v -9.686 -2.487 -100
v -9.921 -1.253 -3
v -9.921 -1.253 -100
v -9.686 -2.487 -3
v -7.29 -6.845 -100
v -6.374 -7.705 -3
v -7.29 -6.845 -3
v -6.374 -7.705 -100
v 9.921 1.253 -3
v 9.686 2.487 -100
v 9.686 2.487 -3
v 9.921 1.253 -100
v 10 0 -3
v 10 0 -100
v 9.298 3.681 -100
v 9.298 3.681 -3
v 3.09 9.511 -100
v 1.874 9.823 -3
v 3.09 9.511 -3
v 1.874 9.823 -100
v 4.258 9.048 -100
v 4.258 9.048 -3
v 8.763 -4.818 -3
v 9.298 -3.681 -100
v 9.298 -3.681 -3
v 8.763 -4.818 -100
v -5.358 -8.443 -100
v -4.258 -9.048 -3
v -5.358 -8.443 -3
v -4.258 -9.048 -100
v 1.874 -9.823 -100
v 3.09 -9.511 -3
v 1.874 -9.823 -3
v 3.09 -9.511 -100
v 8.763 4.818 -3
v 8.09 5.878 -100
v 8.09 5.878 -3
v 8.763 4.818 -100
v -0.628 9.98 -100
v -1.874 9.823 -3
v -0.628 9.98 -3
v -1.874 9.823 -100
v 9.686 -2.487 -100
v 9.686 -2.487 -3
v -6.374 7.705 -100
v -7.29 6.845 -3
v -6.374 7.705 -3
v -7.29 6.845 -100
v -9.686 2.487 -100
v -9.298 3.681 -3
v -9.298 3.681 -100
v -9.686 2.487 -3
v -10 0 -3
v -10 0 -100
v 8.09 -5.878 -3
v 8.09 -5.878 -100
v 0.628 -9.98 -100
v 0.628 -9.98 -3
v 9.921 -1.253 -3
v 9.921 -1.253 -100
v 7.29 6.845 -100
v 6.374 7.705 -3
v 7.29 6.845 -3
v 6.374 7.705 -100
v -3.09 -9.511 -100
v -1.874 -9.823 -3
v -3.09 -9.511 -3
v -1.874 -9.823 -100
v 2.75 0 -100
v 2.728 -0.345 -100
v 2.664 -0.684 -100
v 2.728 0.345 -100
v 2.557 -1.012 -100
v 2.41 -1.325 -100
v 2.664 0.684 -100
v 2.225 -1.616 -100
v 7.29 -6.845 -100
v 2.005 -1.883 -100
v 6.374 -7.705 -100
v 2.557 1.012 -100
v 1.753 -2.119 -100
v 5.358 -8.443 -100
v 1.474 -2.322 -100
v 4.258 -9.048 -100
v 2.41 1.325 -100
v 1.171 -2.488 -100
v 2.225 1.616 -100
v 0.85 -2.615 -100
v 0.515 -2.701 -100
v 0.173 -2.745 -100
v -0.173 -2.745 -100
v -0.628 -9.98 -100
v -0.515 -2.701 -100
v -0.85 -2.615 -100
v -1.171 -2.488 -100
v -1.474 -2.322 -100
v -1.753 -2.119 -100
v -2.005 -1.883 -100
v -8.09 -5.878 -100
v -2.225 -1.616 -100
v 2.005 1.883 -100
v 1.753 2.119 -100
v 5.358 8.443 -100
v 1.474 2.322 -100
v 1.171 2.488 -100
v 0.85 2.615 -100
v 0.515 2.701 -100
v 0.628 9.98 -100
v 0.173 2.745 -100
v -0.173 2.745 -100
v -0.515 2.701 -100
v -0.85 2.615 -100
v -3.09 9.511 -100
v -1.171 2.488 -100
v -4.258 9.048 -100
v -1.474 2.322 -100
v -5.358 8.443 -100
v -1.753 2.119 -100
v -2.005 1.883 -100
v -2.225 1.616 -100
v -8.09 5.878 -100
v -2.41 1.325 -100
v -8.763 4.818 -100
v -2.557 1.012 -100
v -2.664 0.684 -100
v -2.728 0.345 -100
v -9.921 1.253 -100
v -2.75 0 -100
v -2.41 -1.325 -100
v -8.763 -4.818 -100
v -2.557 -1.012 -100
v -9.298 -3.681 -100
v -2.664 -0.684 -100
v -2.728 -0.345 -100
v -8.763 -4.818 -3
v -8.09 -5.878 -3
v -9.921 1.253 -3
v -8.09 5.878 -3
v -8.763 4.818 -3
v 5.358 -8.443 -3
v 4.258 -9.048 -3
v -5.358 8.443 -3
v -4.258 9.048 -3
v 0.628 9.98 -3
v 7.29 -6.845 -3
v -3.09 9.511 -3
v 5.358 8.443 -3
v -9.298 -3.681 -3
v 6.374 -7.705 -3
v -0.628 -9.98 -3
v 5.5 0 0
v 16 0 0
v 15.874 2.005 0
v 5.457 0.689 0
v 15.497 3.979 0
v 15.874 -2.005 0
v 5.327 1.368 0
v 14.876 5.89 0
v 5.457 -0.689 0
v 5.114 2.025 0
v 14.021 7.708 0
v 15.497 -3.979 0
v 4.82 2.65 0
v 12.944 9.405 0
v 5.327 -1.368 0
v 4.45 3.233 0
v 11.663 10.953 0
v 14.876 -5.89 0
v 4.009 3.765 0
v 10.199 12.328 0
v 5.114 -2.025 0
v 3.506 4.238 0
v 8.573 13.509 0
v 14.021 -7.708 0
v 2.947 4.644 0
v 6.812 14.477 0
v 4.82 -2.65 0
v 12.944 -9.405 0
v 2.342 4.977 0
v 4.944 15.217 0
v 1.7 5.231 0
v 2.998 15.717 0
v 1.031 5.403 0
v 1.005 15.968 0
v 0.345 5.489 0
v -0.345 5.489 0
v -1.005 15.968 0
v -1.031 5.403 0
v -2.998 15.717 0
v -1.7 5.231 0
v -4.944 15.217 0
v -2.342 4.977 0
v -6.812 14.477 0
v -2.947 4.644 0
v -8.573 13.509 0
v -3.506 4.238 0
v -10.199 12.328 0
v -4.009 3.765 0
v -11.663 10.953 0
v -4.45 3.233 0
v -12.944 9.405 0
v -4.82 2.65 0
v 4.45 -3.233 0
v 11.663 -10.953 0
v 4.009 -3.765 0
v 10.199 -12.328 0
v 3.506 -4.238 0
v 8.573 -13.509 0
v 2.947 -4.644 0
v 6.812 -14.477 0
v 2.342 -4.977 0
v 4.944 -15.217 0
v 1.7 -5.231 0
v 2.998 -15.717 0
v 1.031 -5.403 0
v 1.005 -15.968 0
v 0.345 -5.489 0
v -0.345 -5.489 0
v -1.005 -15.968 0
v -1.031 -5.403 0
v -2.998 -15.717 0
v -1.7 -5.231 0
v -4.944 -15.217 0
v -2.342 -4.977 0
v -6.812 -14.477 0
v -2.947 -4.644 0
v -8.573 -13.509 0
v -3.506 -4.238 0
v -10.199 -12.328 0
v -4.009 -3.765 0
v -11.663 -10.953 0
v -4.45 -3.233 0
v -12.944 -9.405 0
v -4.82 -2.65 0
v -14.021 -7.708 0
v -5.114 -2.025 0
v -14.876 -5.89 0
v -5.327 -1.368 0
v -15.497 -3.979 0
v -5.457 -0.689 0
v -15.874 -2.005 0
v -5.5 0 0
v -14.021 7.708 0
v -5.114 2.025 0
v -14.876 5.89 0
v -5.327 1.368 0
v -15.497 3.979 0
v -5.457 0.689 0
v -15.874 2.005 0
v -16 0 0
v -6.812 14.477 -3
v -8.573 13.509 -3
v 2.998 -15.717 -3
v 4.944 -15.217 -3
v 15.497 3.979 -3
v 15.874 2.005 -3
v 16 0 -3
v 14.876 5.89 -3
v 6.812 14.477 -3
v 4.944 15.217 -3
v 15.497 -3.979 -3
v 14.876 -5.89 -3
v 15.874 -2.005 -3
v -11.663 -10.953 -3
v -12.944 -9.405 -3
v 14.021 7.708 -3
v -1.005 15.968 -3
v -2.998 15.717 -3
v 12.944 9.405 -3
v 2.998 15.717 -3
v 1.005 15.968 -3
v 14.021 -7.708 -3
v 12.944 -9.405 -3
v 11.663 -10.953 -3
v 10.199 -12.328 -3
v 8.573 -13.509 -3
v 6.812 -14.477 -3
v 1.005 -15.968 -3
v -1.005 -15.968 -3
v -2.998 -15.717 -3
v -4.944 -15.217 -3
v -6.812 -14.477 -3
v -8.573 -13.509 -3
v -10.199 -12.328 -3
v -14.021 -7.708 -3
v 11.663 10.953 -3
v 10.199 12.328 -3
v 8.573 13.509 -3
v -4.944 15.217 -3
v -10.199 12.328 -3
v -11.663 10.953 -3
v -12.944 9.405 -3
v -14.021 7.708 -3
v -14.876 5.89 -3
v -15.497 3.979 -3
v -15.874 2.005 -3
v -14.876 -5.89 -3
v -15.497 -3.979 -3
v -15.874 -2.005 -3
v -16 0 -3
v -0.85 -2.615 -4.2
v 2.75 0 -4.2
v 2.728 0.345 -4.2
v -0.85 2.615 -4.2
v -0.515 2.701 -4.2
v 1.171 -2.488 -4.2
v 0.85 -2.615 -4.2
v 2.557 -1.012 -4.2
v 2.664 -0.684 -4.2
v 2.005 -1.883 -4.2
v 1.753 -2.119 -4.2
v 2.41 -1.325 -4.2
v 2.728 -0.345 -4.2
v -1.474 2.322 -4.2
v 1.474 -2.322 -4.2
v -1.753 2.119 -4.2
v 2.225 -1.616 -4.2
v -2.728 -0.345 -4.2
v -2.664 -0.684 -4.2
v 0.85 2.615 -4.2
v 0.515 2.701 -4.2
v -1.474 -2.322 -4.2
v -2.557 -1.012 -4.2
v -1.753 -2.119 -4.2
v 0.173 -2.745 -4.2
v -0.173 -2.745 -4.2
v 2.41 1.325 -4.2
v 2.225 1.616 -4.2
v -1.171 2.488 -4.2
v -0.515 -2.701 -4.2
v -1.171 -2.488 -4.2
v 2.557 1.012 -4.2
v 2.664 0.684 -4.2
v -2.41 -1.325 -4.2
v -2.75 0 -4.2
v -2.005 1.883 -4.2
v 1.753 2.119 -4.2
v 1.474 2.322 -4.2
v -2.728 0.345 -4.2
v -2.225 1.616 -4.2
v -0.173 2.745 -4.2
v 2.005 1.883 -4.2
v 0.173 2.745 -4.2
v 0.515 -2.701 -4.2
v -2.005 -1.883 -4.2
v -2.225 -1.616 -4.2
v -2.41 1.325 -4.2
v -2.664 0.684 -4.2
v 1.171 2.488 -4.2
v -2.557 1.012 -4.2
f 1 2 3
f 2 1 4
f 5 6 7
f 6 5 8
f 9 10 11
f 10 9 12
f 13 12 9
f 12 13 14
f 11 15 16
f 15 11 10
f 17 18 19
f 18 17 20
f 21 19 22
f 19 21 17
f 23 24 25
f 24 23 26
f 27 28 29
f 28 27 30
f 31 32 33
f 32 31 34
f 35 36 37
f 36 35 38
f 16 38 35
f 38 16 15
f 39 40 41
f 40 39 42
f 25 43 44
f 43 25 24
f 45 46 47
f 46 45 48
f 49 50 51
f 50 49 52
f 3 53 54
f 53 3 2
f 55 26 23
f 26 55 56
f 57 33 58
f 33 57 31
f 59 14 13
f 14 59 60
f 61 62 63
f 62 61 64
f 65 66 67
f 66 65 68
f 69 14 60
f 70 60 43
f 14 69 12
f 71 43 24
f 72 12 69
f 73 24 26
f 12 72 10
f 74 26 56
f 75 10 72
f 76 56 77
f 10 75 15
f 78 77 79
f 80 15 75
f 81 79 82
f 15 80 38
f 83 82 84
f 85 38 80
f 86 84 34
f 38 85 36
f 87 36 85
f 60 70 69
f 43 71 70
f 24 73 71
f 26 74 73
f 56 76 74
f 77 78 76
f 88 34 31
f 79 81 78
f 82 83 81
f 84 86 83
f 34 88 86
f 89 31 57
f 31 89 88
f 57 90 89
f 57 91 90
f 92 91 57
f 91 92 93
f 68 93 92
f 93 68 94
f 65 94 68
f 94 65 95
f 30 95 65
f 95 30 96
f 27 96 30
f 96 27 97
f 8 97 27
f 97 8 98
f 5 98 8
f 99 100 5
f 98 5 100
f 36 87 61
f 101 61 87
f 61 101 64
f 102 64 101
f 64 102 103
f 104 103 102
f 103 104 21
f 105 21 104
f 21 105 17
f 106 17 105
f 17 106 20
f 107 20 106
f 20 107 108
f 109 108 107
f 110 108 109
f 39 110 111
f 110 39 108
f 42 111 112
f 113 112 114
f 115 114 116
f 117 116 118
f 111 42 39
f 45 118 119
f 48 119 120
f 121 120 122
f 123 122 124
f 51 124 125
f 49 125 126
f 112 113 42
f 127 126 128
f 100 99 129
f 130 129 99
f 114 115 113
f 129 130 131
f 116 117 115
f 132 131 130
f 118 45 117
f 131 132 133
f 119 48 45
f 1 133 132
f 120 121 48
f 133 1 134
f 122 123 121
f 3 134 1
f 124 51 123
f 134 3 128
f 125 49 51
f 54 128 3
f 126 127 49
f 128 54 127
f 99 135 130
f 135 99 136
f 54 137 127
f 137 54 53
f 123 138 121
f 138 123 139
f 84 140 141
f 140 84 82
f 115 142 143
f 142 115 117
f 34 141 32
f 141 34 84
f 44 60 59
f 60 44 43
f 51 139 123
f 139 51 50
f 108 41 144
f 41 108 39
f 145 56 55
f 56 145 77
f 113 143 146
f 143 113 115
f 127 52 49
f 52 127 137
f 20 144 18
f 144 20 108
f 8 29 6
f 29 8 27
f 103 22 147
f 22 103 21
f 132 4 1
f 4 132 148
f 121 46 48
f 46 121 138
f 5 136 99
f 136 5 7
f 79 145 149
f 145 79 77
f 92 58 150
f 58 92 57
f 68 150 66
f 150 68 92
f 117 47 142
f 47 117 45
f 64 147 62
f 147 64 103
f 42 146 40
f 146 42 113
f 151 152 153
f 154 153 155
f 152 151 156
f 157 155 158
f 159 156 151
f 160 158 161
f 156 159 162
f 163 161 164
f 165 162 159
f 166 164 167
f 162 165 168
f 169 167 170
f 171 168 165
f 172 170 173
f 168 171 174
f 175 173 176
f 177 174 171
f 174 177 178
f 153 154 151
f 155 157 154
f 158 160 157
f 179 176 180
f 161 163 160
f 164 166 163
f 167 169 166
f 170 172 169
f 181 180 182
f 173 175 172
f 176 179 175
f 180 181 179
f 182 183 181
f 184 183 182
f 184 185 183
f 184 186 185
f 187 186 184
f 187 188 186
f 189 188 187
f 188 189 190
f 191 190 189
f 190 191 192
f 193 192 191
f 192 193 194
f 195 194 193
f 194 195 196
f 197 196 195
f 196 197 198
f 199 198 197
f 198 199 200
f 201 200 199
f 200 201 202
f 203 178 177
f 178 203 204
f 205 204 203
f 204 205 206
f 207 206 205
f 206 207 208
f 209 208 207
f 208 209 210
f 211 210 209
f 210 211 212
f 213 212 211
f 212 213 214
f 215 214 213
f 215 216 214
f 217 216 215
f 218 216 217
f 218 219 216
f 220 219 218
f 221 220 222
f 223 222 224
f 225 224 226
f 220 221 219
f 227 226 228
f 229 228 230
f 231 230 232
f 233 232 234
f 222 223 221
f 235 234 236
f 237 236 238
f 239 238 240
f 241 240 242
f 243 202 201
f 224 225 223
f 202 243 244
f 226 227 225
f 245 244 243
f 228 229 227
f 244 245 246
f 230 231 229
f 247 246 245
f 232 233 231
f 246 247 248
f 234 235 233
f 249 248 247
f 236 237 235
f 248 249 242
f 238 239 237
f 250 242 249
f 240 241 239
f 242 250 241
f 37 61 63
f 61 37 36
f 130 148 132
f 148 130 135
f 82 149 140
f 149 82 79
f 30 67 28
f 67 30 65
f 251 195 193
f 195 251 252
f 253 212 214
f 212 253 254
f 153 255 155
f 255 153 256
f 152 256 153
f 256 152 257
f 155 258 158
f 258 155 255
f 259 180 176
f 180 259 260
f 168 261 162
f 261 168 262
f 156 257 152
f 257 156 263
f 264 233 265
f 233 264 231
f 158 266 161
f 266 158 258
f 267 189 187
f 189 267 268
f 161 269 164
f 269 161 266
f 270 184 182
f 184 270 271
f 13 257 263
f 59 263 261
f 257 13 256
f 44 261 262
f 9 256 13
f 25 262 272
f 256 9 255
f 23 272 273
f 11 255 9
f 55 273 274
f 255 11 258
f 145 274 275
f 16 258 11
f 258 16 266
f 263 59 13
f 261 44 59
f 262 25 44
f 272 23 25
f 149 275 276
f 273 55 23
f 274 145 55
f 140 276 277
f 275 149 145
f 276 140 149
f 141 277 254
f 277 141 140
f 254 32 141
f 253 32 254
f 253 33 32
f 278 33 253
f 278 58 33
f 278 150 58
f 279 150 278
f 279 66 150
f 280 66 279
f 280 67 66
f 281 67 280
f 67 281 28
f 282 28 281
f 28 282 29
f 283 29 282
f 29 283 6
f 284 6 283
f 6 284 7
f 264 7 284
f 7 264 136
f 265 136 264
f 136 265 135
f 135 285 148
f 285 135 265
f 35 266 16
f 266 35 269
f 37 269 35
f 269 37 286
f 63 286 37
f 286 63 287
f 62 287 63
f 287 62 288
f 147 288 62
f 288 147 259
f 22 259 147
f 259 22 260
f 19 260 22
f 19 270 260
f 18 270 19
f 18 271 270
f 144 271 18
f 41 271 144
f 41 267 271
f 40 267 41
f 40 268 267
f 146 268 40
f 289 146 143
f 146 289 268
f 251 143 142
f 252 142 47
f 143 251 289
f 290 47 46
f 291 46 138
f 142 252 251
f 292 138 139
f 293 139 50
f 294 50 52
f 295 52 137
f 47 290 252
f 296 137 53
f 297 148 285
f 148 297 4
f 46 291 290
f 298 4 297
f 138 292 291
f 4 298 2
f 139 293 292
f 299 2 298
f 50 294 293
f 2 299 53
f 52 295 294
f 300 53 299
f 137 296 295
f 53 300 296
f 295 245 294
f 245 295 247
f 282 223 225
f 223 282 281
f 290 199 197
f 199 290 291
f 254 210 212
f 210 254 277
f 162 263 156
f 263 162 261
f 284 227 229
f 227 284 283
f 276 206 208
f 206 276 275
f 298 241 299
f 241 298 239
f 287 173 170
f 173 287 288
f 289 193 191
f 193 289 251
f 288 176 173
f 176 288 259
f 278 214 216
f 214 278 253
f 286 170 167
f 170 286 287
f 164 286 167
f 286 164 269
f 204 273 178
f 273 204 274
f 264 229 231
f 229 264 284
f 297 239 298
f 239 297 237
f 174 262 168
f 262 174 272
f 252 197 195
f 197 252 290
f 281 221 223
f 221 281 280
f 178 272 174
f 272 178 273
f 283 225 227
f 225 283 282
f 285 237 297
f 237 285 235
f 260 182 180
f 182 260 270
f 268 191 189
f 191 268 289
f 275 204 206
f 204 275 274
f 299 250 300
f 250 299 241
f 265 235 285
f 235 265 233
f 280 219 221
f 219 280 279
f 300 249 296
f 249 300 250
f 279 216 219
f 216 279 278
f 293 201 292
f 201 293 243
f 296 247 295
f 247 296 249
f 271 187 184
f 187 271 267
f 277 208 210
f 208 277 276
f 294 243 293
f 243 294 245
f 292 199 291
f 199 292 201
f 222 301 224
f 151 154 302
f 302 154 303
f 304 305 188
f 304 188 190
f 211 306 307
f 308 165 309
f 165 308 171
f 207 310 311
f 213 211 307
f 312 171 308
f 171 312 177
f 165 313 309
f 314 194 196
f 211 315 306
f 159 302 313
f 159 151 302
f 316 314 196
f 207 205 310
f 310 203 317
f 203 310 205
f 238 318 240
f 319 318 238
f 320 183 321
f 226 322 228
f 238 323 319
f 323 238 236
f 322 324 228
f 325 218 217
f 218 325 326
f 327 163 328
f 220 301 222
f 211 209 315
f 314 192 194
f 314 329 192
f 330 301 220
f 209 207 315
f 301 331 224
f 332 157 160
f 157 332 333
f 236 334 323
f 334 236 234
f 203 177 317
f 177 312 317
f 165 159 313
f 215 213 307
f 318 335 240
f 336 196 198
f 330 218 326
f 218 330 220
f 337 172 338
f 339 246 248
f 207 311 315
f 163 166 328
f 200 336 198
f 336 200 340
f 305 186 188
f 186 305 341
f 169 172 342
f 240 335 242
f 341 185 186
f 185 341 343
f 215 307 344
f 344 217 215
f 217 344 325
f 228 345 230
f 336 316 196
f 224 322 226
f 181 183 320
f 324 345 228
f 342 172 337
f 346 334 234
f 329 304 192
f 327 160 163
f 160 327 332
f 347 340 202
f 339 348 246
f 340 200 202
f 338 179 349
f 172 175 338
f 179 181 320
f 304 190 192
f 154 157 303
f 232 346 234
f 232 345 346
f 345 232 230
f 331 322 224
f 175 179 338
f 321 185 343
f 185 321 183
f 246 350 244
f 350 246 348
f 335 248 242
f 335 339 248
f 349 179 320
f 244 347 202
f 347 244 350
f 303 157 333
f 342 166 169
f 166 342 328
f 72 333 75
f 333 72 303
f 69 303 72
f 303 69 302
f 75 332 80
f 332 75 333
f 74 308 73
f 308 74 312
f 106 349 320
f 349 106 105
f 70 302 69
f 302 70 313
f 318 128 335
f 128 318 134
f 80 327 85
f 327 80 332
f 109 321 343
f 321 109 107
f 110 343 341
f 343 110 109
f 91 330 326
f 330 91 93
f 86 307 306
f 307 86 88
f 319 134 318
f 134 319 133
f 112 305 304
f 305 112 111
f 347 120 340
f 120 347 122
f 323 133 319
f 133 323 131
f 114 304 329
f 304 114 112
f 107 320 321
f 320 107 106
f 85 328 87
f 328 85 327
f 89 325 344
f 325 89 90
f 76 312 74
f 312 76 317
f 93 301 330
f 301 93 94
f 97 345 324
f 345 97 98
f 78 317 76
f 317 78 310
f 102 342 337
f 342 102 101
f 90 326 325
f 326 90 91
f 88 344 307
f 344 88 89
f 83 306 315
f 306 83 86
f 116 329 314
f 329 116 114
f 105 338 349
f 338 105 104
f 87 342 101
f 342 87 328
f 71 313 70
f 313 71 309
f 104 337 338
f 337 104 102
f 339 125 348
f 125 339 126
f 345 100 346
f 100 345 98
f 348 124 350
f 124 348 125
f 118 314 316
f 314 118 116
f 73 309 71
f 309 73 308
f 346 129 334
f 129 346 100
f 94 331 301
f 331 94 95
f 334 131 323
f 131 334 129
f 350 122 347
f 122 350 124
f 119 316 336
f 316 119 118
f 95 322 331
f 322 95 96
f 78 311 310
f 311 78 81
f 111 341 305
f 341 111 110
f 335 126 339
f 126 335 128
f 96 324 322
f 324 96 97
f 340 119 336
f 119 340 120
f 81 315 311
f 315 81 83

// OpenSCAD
$fn = 50;


difference() {
	union() {
		translate(v = [0, 0, -100.0000000000]) {
			cylinder(h = 100, r = 10.0000000000);
		}
		translate(v = [0, 0, -3.0000000000]) {
			cylinder(h = 3, r = 16.0000000000);
		}
	}
	union() {
		translate(v = [0, 0, 0]) {
			rotate(a = [0, 0, 0]) {
				difference() {
					union() {
						#translate(v = [0, 0, -100.0000000000]) {
							cylinder(h = 100, r = 2.2500000000);
						}
						#translate(v = [0, 0, -4.2000000000]) {
							cylinder(h = 4.2000000000, r1 = 2.7500000000, r2 = 5.5000000000);
						}
						#translate(v = [0, 0, -100.0000000000]) {
							cylinder(h = 100, r = 2.7500000000);
						}
						#translate(v = [0, 0, -100.0000000000]) {
							cylinder(h = 100, r = 2.2500000000);
						}
					}
					union();
				}
			}
		}
	}
}
